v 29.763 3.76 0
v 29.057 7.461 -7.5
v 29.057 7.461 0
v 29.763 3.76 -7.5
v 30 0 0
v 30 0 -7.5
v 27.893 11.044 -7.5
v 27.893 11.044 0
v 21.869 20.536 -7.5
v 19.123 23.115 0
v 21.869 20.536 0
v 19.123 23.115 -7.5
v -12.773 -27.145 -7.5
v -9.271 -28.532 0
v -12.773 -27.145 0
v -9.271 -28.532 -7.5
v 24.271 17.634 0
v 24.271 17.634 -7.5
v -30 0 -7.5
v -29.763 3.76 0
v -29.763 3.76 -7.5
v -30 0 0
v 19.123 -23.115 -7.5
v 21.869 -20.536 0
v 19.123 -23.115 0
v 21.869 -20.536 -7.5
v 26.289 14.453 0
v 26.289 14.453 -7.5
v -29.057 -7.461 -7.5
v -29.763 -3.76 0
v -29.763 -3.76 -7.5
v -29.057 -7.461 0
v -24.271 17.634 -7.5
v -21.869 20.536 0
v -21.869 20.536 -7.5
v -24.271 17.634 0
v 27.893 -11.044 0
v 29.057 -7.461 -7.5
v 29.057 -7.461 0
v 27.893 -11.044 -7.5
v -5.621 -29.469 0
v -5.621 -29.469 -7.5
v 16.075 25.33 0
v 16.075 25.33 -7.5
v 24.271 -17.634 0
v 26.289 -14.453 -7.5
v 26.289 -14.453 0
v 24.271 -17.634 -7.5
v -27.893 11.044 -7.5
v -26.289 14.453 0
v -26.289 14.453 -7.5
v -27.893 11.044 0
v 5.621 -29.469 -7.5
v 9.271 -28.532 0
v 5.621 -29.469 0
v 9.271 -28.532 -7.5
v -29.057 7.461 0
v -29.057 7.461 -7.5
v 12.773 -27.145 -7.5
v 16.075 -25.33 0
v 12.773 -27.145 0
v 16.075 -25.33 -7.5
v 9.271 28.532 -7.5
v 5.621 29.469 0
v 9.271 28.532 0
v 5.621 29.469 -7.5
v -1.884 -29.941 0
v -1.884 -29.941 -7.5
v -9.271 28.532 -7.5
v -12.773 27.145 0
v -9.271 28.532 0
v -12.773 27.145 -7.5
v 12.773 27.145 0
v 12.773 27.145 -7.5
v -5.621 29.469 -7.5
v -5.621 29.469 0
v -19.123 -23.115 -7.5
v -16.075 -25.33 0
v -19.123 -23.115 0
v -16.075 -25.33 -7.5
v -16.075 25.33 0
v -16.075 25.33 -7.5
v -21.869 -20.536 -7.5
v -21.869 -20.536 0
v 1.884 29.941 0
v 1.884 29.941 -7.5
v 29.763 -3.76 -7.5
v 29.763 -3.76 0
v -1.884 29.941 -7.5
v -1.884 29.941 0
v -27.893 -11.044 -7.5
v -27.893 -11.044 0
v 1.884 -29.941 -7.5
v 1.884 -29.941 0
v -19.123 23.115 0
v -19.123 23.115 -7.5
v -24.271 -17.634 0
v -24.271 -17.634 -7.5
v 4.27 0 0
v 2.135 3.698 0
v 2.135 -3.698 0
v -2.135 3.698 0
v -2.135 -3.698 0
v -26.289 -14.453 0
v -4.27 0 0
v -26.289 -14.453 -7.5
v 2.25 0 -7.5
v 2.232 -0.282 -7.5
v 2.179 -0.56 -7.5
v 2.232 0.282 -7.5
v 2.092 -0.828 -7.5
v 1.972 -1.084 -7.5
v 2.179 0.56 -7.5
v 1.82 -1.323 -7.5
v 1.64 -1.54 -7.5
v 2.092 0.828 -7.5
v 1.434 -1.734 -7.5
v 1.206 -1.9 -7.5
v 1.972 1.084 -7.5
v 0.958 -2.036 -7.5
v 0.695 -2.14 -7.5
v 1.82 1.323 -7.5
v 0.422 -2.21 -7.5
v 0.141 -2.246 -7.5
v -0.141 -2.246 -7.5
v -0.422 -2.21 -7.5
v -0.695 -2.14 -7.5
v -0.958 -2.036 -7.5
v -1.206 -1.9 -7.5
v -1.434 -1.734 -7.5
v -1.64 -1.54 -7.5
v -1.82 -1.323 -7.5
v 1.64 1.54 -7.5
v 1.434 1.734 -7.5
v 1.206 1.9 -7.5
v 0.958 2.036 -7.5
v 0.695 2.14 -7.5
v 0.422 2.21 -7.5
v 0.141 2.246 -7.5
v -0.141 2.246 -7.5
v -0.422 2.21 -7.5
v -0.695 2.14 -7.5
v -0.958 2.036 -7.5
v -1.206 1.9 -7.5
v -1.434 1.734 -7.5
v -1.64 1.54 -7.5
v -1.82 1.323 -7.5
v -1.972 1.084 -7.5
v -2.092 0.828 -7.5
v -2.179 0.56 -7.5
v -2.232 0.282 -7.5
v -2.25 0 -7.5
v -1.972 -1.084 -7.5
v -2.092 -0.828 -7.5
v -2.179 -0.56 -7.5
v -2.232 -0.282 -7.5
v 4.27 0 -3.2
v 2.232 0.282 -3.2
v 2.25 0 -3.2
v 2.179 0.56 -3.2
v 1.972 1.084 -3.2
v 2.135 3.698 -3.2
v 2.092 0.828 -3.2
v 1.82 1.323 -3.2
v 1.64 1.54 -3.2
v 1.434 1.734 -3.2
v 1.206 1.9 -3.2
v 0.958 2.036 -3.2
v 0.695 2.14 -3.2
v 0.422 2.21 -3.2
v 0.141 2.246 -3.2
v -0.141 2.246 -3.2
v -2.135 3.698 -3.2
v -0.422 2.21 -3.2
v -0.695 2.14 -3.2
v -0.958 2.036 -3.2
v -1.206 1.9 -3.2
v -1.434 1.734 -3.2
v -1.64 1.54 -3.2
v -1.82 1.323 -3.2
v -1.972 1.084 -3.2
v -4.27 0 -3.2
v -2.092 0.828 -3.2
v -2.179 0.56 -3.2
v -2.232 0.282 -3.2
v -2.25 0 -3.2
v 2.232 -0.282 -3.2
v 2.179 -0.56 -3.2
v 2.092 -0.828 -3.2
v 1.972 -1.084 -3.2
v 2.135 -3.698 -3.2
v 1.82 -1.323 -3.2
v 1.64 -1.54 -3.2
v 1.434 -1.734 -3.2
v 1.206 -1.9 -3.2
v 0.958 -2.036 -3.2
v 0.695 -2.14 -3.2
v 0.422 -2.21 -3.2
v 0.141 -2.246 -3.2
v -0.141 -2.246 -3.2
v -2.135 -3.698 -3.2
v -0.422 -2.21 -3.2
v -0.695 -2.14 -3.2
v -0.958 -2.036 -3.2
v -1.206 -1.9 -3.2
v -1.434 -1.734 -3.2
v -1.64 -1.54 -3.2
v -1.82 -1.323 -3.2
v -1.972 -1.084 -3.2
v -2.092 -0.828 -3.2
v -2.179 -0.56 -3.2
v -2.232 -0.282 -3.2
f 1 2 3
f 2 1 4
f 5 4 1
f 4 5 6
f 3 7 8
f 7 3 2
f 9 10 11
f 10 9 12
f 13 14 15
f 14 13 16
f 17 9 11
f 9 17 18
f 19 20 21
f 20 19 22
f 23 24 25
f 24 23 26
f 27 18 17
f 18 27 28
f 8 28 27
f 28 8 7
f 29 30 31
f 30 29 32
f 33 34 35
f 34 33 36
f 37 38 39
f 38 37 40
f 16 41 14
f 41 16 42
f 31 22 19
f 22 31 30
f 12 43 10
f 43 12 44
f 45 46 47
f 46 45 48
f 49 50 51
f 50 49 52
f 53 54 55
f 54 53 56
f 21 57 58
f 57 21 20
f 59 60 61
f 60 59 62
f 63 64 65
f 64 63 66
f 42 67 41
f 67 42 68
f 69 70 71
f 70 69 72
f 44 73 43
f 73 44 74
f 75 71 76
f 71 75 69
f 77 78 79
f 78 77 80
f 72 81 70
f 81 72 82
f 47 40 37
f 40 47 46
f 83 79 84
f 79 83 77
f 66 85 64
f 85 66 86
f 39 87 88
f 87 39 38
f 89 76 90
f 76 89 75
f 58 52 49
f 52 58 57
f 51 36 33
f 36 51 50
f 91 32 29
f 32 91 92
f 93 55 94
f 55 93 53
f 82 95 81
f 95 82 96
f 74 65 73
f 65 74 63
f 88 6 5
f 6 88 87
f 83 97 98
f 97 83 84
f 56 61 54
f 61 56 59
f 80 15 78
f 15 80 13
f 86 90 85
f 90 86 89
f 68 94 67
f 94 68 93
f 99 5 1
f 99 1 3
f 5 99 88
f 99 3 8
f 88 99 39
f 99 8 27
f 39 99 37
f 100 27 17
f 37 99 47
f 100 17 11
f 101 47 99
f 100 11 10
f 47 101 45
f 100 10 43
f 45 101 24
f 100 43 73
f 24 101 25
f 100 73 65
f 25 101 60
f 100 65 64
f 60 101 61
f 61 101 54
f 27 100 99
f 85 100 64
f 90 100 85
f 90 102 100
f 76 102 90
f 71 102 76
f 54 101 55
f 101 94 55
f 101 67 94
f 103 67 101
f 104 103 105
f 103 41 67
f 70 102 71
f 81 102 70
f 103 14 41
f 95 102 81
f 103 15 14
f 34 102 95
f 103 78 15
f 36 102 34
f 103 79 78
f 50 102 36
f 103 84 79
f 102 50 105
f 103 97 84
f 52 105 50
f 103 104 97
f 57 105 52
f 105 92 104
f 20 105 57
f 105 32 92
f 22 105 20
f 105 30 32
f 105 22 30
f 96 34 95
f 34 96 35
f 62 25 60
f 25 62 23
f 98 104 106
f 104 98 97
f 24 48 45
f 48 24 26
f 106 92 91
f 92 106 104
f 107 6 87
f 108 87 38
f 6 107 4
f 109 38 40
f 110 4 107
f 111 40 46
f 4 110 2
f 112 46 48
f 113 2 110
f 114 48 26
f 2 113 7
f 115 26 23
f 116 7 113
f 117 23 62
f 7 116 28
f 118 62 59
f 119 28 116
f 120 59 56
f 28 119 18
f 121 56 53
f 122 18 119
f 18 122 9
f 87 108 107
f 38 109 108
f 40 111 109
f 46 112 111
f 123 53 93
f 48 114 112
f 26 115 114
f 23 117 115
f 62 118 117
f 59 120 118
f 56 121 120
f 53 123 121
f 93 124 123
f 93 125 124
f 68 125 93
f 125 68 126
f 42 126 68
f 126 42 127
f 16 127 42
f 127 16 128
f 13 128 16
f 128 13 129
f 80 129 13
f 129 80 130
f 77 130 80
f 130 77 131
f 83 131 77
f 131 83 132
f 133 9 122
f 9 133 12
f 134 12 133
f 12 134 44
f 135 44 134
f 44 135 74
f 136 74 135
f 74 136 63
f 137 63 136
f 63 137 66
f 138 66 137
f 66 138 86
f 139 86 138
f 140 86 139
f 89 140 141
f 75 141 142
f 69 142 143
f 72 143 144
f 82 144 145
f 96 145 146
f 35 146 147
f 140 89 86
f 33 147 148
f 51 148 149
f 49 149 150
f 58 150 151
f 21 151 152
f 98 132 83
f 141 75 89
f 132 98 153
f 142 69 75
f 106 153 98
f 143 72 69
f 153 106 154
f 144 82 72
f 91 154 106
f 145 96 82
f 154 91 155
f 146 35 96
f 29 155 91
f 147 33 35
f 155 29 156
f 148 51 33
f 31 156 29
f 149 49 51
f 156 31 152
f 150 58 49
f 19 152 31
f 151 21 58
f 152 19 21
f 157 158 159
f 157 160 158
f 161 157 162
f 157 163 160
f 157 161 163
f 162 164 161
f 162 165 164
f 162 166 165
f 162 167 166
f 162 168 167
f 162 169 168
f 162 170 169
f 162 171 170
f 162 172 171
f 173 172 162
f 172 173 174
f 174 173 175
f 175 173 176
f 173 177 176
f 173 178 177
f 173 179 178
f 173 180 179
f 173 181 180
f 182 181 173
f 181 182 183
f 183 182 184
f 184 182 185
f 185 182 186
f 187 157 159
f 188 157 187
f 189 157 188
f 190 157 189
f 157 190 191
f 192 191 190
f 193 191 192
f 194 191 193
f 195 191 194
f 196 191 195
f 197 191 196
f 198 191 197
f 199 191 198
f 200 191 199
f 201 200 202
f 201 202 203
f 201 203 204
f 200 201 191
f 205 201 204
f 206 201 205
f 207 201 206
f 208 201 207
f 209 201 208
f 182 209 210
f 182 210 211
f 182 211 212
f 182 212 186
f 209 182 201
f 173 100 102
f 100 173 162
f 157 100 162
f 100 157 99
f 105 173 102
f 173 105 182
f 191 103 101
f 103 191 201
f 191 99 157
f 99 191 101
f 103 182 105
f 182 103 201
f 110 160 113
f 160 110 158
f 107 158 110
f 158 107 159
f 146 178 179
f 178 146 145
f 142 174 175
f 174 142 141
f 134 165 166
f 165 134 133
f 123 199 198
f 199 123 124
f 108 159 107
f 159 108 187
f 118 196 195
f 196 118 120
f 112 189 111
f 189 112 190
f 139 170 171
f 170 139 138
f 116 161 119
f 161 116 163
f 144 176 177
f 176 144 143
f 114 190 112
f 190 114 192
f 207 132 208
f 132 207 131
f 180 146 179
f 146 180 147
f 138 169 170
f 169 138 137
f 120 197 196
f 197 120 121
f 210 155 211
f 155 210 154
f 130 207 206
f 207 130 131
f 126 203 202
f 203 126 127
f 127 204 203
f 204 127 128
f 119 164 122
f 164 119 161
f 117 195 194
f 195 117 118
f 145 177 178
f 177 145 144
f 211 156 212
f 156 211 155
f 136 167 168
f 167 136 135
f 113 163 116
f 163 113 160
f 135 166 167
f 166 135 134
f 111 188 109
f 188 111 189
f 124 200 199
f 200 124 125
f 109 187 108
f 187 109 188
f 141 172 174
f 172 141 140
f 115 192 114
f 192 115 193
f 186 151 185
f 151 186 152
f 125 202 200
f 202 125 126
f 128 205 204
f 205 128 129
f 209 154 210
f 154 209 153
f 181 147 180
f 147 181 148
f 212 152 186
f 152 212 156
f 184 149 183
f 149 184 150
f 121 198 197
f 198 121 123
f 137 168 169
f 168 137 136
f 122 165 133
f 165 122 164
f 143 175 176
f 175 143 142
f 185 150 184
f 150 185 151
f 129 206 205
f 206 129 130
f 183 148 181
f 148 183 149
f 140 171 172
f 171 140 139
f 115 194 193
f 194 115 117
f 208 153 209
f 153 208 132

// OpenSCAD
$fn = 50;


difference() {
	union() {
		translate(v = [0, 0, -7.5000000000]) {
			cylinder(h = 7.5000000000, r = 30.0000000000);
		}
		translate(v = [0, 0, -6.0000000000]) {
			cylinder(h = 6, r = 2.8750000000);
		}
	}
	union() {
		translate(v = [0, 0, 0]) {
			rotate(a = [0, 0, 0]) {
				difference() {
					union() {
						translate(v = [0, 0, -3.2000000000]) {
							linear_extrude(height = 3.2000000000) {
								polygon(points = [[4.2698000000, 0.0000000000], [2.1349000000, 3.6977552691], [-2.1349000000, 3.6977552691], [-4.2698000000, 0.0000000000], [-2.1349000000, -3.6977552691], [2.1349000000, -3.6977552691]]);
							}
						}
					}
					union();
				}
			}
		}
		#translate(v = [0, 0, -100.0000000000]) {
			cylinder(h = 200, r = 2.2500000000);
		}
	}
}
